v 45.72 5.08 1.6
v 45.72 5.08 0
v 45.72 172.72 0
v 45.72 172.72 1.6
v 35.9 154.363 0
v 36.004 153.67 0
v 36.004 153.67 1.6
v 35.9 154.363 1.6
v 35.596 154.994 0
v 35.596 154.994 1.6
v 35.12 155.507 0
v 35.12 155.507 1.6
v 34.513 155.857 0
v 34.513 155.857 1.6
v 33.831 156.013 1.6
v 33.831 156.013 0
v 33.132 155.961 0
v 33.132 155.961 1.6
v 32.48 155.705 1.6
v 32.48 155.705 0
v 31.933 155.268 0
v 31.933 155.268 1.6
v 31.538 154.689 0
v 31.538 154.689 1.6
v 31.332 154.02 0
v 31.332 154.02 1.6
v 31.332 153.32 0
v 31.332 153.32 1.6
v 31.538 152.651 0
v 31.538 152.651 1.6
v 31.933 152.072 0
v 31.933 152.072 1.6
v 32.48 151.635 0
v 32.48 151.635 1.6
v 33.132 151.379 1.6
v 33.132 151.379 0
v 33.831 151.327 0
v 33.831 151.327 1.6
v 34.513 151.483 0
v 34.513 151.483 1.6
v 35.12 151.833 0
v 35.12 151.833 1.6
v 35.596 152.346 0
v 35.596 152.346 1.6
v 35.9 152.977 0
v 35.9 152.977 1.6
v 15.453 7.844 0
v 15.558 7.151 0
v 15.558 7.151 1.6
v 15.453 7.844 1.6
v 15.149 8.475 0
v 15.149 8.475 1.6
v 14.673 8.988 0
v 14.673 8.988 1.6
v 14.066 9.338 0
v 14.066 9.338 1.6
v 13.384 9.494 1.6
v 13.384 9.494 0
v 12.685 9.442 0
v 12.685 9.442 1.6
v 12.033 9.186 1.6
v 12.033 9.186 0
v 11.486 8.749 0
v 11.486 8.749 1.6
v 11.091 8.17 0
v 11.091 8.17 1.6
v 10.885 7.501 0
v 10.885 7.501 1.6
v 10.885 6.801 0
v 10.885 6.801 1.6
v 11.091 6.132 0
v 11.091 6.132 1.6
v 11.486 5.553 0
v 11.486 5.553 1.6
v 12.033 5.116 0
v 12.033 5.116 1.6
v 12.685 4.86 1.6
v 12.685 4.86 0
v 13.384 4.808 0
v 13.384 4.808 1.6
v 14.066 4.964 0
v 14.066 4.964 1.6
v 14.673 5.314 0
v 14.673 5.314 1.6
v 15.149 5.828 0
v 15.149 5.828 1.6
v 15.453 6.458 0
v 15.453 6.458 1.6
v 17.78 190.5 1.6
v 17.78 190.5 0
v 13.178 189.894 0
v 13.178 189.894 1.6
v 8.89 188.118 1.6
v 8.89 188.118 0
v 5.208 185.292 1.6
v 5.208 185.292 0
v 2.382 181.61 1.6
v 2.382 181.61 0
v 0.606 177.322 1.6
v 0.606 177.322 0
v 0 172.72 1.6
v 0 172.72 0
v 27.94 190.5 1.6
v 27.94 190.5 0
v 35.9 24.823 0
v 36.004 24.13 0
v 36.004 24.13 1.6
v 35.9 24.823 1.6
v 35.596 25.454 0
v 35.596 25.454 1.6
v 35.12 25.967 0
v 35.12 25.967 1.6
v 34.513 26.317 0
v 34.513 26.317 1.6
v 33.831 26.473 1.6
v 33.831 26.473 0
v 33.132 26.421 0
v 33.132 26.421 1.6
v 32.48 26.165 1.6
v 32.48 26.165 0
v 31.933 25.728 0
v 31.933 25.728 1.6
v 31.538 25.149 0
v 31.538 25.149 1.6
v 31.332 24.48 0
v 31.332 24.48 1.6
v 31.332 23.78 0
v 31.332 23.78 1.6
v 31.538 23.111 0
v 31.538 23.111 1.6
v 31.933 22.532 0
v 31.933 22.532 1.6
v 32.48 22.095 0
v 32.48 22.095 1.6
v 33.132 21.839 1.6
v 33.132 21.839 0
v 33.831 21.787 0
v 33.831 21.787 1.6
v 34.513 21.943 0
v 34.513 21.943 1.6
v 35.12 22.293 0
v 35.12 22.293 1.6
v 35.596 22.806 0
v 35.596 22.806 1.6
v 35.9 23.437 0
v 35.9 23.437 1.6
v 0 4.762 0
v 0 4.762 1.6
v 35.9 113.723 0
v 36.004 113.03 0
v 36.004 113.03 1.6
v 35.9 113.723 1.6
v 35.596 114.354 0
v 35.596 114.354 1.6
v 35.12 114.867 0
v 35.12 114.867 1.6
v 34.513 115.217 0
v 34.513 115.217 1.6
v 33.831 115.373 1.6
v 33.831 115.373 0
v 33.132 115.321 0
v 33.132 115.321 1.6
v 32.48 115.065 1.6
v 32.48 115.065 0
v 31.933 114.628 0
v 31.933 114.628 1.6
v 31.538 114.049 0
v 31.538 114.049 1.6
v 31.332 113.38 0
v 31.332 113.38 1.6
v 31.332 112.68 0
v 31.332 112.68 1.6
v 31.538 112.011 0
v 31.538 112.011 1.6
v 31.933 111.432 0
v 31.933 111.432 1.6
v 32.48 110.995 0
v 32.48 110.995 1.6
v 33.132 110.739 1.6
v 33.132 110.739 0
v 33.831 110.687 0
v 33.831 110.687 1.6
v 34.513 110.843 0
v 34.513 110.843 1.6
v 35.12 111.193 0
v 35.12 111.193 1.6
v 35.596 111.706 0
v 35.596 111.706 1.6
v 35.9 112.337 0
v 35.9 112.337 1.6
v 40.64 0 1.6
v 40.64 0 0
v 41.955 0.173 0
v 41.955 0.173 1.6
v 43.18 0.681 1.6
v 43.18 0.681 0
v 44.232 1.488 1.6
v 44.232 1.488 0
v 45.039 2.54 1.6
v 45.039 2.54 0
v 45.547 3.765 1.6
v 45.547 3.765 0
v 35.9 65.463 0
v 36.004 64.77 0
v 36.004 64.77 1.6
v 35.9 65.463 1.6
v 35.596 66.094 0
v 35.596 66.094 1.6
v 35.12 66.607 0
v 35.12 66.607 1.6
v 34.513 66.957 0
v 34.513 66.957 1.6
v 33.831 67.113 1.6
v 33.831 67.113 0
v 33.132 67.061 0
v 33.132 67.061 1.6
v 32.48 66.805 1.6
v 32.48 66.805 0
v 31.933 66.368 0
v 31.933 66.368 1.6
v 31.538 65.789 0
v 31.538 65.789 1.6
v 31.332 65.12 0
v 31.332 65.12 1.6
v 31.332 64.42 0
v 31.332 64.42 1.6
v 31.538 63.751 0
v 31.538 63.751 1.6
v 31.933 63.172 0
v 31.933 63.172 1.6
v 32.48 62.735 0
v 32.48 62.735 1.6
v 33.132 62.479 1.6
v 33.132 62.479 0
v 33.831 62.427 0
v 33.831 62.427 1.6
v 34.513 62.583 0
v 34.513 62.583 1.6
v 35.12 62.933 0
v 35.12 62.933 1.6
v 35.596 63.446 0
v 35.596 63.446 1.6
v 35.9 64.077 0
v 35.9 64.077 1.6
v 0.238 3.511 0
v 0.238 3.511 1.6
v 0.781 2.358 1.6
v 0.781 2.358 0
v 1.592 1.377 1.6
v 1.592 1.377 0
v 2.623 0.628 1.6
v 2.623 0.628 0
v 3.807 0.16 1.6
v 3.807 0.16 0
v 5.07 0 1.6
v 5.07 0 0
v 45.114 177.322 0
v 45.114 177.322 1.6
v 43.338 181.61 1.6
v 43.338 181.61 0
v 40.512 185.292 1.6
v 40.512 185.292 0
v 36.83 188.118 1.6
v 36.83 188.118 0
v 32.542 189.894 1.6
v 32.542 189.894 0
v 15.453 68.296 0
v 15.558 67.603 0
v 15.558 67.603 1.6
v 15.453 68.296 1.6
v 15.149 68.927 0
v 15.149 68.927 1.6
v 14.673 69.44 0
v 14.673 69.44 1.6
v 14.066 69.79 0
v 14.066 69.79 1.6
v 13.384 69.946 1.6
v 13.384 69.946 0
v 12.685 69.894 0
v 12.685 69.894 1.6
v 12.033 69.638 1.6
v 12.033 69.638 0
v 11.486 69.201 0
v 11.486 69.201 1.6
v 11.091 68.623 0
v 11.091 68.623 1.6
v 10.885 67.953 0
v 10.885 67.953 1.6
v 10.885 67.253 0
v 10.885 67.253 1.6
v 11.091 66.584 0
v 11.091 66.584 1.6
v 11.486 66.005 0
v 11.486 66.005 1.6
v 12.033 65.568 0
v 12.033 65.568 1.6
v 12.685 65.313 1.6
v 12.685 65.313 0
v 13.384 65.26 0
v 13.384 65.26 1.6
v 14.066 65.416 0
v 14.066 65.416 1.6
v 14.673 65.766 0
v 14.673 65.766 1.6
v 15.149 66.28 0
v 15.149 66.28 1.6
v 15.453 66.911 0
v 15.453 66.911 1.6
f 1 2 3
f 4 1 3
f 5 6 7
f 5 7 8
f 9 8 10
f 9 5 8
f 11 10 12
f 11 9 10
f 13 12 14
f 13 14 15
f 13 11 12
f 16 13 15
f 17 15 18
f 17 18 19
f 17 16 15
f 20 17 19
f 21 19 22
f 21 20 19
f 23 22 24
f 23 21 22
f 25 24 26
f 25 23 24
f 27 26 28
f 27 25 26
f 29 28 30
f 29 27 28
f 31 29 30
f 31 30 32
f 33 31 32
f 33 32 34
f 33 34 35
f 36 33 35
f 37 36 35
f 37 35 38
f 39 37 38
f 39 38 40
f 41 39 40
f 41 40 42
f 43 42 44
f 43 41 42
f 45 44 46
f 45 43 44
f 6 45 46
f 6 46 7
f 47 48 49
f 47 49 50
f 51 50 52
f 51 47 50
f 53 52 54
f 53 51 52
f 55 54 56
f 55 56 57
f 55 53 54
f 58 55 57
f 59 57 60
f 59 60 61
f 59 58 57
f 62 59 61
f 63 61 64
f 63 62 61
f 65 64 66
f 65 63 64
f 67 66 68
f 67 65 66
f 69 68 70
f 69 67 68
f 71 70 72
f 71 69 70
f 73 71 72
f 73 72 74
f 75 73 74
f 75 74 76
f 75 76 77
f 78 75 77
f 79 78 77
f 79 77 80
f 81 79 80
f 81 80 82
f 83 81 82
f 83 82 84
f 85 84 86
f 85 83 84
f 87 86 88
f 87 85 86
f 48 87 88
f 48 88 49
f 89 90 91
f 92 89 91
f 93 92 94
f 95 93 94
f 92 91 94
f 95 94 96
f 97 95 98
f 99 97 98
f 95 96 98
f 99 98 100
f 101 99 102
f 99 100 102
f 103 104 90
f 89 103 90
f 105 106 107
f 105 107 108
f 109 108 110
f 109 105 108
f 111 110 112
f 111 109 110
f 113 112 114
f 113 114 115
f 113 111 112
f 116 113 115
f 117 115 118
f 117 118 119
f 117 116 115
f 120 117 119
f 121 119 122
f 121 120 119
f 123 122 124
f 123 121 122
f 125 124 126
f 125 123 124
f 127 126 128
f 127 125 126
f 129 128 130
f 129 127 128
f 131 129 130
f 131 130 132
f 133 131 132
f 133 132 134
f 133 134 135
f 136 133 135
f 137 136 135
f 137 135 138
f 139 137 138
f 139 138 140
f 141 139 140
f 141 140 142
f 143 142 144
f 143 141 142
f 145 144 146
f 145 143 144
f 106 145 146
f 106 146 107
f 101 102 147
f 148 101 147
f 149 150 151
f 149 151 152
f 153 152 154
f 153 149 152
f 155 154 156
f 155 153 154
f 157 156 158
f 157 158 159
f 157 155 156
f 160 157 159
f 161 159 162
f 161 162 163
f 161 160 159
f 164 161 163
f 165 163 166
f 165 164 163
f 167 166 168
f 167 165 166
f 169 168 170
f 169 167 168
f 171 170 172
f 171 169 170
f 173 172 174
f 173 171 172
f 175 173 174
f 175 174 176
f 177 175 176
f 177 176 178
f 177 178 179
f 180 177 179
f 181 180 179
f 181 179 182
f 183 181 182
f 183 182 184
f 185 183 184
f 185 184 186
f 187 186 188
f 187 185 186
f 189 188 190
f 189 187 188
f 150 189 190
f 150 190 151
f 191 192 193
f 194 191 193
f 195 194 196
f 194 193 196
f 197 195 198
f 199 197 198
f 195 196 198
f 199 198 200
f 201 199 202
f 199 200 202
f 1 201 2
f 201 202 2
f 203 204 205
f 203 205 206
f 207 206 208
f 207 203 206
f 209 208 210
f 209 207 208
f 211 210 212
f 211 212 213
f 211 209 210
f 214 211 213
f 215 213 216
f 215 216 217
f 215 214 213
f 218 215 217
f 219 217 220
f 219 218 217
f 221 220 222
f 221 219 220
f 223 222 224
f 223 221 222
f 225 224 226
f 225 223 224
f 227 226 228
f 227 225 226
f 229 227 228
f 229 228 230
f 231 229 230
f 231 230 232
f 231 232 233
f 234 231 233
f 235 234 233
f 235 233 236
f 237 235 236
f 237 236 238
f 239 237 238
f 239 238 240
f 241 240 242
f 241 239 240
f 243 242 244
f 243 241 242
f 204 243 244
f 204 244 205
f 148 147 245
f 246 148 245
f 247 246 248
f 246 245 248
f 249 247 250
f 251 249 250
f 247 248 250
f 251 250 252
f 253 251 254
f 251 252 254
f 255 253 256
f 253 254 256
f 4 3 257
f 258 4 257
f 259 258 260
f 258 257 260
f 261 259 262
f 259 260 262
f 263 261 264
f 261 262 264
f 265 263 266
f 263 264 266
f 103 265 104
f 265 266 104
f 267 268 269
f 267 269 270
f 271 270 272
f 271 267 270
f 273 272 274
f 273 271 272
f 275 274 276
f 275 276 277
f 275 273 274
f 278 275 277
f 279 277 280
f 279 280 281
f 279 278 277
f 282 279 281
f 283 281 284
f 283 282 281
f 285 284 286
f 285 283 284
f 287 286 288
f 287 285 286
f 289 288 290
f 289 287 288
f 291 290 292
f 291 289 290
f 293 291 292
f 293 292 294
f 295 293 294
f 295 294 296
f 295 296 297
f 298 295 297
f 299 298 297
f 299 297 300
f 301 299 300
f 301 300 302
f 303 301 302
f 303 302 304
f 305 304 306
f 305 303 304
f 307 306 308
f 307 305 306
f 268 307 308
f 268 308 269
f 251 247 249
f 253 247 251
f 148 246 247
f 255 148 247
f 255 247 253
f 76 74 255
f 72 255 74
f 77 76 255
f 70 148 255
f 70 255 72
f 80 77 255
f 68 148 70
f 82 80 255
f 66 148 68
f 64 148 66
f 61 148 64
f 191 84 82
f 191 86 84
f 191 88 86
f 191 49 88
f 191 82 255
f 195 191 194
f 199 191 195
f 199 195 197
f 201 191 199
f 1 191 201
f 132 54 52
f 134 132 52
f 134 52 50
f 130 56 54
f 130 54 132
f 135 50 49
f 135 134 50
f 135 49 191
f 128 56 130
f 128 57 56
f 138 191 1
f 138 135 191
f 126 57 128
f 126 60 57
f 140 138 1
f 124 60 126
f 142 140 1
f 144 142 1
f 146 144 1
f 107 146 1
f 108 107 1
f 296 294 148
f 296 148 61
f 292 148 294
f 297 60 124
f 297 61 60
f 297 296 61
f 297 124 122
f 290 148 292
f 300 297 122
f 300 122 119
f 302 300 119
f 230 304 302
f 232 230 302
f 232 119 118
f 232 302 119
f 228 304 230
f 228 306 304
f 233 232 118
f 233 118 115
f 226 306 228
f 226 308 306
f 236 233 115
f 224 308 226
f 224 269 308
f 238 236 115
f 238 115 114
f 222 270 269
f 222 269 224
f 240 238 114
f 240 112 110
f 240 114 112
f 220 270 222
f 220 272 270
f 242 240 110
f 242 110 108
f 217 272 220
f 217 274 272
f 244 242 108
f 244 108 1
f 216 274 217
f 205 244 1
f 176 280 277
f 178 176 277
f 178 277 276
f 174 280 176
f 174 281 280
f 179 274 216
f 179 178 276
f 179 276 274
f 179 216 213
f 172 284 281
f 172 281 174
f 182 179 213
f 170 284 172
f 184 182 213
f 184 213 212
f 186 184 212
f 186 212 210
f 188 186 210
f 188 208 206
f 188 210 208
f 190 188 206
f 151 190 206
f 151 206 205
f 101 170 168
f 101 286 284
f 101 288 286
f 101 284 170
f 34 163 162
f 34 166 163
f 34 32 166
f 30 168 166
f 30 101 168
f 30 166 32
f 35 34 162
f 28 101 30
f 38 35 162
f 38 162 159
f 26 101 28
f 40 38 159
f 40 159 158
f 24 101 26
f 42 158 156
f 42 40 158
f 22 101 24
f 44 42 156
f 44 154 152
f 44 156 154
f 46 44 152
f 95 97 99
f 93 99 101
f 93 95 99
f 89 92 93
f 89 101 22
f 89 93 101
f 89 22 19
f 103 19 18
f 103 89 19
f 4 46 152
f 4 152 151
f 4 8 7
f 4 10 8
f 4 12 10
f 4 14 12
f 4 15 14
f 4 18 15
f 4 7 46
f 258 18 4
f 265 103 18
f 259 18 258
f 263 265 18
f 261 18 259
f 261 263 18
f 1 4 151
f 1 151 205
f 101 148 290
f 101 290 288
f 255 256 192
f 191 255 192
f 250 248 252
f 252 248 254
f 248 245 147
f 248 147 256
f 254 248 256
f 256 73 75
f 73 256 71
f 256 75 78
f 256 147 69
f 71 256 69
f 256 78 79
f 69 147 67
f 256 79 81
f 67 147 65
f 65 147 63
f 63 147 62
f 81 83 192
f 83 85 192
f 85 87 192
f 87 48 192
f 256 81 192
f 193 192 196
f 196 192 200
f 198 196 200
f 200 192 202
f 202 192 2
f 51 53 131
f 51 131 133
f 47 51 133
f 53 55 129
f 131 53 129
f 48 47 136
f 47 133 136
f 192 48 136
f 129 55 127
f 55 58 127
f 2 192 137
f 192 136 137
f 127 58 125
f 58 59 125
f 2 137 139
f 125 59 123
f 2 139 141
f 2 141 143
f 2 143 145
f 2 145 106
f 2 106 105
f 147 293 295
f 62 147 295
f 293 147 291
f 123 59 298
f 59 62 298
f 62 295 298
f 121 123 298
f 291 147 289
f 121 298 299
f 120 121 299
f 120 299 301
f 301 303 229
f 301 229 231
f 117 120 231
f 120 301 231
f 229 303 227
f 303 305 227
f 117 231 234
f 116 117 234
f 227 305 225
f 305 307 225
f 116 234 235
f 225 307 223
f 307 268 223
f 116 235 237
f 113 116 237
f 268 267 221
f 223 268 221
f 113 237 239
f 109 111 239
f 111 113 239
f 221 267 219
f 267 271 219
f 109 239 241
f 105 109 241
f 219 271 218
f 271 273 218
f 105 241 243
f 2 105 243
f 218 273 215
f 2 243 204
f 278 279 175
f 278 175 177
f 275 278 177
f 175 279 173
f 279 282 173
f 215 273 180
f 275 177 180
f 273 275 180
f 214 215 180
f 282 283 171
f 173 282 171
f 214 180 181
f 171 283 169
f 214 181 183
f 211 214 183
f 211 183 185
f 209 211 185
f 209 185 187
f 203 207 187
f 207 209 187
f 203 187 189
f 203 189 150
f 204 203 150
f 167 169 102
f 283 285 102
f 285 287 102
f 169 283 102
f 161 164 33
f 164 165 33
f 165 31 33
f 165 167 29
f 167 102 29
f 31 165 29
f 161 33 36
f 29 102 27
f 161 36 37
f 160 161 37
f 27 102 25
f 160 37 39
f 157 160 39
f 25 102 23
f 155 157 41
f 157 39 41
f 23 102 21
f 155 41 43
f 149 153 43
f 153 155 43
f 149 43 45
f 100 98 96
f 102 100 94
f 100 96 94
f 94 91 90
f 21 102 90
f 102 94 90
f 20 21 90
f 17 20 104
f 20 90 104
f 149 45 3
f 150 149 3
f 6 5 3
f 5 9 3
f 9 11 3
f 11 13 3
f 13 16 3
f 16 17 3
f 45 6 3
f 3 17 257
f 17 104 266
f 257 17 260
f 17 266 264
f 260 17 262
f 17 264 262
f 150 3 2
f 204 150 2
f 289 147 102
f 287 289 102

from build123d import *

# Parameters (mm, degrees)
SKETCH1_R           = 2.3495
BOSS_EXTRUDE2_DEPTH = 1.6002


with BuildPart() as part:
    # Sketch1 → Boss-Extrude2 (new body)
    with BuildSketch(Plane.XY):
        with BuildLine():
            Line((45.72, 5.08), (45.72, 172.72))
            ThreePointArc((45.72, 172.72), (40.512358569, 185.292358569), (27.94, 190.5))
            Line((27.94, 190.5), (17.78, 190.5))
            ThreePointArc((17.78, 190.5), (5.207641431, 185.292358569), (0, 172.72))
            Line((0, 172.72), (0, 4.761637225))
            ThreePointArc((0, 4.761637225), (1.592291129, 1.377049629), (5.070014314, 0))
            Line((5.070014314, 0), (33.655, 0))
            Line((33.655, 0), (40.64, 0))
            ThreePointArc((40.64, 0), (44.232102448, 1.487897552), (45.72, 5.08))
        make_face()
        with Locations((33.655, 24.13)):
            Circle(SKETCH1_R, mode=Mode.SUBTRACT)
        with Locations((33.655, 64.77)):
            Circle(SKETCH1_R, mode=Mode.SUBTRACT)
        with Locations((33.655, 113.03)):
            Circle(SKETCH1_R, mode=Mode.SUBTRACT)
        with Locations((33.655, 153.67)):
            Circle(SKETCH1_R, mode=Mode.SUBTRACT)
        with Locations((13.208, 7.15102725)):
            Circle(SKETCH1_R, mode=Mode.SUBTRACT)
        with Locations((13.208, 67.603137295)):
            Circle(SKETCH1_R, mode=Mode.SUBTRACT)
    extrude(amount=BOSS_EXTRUDE2_DEPTH)


solid = part.part
